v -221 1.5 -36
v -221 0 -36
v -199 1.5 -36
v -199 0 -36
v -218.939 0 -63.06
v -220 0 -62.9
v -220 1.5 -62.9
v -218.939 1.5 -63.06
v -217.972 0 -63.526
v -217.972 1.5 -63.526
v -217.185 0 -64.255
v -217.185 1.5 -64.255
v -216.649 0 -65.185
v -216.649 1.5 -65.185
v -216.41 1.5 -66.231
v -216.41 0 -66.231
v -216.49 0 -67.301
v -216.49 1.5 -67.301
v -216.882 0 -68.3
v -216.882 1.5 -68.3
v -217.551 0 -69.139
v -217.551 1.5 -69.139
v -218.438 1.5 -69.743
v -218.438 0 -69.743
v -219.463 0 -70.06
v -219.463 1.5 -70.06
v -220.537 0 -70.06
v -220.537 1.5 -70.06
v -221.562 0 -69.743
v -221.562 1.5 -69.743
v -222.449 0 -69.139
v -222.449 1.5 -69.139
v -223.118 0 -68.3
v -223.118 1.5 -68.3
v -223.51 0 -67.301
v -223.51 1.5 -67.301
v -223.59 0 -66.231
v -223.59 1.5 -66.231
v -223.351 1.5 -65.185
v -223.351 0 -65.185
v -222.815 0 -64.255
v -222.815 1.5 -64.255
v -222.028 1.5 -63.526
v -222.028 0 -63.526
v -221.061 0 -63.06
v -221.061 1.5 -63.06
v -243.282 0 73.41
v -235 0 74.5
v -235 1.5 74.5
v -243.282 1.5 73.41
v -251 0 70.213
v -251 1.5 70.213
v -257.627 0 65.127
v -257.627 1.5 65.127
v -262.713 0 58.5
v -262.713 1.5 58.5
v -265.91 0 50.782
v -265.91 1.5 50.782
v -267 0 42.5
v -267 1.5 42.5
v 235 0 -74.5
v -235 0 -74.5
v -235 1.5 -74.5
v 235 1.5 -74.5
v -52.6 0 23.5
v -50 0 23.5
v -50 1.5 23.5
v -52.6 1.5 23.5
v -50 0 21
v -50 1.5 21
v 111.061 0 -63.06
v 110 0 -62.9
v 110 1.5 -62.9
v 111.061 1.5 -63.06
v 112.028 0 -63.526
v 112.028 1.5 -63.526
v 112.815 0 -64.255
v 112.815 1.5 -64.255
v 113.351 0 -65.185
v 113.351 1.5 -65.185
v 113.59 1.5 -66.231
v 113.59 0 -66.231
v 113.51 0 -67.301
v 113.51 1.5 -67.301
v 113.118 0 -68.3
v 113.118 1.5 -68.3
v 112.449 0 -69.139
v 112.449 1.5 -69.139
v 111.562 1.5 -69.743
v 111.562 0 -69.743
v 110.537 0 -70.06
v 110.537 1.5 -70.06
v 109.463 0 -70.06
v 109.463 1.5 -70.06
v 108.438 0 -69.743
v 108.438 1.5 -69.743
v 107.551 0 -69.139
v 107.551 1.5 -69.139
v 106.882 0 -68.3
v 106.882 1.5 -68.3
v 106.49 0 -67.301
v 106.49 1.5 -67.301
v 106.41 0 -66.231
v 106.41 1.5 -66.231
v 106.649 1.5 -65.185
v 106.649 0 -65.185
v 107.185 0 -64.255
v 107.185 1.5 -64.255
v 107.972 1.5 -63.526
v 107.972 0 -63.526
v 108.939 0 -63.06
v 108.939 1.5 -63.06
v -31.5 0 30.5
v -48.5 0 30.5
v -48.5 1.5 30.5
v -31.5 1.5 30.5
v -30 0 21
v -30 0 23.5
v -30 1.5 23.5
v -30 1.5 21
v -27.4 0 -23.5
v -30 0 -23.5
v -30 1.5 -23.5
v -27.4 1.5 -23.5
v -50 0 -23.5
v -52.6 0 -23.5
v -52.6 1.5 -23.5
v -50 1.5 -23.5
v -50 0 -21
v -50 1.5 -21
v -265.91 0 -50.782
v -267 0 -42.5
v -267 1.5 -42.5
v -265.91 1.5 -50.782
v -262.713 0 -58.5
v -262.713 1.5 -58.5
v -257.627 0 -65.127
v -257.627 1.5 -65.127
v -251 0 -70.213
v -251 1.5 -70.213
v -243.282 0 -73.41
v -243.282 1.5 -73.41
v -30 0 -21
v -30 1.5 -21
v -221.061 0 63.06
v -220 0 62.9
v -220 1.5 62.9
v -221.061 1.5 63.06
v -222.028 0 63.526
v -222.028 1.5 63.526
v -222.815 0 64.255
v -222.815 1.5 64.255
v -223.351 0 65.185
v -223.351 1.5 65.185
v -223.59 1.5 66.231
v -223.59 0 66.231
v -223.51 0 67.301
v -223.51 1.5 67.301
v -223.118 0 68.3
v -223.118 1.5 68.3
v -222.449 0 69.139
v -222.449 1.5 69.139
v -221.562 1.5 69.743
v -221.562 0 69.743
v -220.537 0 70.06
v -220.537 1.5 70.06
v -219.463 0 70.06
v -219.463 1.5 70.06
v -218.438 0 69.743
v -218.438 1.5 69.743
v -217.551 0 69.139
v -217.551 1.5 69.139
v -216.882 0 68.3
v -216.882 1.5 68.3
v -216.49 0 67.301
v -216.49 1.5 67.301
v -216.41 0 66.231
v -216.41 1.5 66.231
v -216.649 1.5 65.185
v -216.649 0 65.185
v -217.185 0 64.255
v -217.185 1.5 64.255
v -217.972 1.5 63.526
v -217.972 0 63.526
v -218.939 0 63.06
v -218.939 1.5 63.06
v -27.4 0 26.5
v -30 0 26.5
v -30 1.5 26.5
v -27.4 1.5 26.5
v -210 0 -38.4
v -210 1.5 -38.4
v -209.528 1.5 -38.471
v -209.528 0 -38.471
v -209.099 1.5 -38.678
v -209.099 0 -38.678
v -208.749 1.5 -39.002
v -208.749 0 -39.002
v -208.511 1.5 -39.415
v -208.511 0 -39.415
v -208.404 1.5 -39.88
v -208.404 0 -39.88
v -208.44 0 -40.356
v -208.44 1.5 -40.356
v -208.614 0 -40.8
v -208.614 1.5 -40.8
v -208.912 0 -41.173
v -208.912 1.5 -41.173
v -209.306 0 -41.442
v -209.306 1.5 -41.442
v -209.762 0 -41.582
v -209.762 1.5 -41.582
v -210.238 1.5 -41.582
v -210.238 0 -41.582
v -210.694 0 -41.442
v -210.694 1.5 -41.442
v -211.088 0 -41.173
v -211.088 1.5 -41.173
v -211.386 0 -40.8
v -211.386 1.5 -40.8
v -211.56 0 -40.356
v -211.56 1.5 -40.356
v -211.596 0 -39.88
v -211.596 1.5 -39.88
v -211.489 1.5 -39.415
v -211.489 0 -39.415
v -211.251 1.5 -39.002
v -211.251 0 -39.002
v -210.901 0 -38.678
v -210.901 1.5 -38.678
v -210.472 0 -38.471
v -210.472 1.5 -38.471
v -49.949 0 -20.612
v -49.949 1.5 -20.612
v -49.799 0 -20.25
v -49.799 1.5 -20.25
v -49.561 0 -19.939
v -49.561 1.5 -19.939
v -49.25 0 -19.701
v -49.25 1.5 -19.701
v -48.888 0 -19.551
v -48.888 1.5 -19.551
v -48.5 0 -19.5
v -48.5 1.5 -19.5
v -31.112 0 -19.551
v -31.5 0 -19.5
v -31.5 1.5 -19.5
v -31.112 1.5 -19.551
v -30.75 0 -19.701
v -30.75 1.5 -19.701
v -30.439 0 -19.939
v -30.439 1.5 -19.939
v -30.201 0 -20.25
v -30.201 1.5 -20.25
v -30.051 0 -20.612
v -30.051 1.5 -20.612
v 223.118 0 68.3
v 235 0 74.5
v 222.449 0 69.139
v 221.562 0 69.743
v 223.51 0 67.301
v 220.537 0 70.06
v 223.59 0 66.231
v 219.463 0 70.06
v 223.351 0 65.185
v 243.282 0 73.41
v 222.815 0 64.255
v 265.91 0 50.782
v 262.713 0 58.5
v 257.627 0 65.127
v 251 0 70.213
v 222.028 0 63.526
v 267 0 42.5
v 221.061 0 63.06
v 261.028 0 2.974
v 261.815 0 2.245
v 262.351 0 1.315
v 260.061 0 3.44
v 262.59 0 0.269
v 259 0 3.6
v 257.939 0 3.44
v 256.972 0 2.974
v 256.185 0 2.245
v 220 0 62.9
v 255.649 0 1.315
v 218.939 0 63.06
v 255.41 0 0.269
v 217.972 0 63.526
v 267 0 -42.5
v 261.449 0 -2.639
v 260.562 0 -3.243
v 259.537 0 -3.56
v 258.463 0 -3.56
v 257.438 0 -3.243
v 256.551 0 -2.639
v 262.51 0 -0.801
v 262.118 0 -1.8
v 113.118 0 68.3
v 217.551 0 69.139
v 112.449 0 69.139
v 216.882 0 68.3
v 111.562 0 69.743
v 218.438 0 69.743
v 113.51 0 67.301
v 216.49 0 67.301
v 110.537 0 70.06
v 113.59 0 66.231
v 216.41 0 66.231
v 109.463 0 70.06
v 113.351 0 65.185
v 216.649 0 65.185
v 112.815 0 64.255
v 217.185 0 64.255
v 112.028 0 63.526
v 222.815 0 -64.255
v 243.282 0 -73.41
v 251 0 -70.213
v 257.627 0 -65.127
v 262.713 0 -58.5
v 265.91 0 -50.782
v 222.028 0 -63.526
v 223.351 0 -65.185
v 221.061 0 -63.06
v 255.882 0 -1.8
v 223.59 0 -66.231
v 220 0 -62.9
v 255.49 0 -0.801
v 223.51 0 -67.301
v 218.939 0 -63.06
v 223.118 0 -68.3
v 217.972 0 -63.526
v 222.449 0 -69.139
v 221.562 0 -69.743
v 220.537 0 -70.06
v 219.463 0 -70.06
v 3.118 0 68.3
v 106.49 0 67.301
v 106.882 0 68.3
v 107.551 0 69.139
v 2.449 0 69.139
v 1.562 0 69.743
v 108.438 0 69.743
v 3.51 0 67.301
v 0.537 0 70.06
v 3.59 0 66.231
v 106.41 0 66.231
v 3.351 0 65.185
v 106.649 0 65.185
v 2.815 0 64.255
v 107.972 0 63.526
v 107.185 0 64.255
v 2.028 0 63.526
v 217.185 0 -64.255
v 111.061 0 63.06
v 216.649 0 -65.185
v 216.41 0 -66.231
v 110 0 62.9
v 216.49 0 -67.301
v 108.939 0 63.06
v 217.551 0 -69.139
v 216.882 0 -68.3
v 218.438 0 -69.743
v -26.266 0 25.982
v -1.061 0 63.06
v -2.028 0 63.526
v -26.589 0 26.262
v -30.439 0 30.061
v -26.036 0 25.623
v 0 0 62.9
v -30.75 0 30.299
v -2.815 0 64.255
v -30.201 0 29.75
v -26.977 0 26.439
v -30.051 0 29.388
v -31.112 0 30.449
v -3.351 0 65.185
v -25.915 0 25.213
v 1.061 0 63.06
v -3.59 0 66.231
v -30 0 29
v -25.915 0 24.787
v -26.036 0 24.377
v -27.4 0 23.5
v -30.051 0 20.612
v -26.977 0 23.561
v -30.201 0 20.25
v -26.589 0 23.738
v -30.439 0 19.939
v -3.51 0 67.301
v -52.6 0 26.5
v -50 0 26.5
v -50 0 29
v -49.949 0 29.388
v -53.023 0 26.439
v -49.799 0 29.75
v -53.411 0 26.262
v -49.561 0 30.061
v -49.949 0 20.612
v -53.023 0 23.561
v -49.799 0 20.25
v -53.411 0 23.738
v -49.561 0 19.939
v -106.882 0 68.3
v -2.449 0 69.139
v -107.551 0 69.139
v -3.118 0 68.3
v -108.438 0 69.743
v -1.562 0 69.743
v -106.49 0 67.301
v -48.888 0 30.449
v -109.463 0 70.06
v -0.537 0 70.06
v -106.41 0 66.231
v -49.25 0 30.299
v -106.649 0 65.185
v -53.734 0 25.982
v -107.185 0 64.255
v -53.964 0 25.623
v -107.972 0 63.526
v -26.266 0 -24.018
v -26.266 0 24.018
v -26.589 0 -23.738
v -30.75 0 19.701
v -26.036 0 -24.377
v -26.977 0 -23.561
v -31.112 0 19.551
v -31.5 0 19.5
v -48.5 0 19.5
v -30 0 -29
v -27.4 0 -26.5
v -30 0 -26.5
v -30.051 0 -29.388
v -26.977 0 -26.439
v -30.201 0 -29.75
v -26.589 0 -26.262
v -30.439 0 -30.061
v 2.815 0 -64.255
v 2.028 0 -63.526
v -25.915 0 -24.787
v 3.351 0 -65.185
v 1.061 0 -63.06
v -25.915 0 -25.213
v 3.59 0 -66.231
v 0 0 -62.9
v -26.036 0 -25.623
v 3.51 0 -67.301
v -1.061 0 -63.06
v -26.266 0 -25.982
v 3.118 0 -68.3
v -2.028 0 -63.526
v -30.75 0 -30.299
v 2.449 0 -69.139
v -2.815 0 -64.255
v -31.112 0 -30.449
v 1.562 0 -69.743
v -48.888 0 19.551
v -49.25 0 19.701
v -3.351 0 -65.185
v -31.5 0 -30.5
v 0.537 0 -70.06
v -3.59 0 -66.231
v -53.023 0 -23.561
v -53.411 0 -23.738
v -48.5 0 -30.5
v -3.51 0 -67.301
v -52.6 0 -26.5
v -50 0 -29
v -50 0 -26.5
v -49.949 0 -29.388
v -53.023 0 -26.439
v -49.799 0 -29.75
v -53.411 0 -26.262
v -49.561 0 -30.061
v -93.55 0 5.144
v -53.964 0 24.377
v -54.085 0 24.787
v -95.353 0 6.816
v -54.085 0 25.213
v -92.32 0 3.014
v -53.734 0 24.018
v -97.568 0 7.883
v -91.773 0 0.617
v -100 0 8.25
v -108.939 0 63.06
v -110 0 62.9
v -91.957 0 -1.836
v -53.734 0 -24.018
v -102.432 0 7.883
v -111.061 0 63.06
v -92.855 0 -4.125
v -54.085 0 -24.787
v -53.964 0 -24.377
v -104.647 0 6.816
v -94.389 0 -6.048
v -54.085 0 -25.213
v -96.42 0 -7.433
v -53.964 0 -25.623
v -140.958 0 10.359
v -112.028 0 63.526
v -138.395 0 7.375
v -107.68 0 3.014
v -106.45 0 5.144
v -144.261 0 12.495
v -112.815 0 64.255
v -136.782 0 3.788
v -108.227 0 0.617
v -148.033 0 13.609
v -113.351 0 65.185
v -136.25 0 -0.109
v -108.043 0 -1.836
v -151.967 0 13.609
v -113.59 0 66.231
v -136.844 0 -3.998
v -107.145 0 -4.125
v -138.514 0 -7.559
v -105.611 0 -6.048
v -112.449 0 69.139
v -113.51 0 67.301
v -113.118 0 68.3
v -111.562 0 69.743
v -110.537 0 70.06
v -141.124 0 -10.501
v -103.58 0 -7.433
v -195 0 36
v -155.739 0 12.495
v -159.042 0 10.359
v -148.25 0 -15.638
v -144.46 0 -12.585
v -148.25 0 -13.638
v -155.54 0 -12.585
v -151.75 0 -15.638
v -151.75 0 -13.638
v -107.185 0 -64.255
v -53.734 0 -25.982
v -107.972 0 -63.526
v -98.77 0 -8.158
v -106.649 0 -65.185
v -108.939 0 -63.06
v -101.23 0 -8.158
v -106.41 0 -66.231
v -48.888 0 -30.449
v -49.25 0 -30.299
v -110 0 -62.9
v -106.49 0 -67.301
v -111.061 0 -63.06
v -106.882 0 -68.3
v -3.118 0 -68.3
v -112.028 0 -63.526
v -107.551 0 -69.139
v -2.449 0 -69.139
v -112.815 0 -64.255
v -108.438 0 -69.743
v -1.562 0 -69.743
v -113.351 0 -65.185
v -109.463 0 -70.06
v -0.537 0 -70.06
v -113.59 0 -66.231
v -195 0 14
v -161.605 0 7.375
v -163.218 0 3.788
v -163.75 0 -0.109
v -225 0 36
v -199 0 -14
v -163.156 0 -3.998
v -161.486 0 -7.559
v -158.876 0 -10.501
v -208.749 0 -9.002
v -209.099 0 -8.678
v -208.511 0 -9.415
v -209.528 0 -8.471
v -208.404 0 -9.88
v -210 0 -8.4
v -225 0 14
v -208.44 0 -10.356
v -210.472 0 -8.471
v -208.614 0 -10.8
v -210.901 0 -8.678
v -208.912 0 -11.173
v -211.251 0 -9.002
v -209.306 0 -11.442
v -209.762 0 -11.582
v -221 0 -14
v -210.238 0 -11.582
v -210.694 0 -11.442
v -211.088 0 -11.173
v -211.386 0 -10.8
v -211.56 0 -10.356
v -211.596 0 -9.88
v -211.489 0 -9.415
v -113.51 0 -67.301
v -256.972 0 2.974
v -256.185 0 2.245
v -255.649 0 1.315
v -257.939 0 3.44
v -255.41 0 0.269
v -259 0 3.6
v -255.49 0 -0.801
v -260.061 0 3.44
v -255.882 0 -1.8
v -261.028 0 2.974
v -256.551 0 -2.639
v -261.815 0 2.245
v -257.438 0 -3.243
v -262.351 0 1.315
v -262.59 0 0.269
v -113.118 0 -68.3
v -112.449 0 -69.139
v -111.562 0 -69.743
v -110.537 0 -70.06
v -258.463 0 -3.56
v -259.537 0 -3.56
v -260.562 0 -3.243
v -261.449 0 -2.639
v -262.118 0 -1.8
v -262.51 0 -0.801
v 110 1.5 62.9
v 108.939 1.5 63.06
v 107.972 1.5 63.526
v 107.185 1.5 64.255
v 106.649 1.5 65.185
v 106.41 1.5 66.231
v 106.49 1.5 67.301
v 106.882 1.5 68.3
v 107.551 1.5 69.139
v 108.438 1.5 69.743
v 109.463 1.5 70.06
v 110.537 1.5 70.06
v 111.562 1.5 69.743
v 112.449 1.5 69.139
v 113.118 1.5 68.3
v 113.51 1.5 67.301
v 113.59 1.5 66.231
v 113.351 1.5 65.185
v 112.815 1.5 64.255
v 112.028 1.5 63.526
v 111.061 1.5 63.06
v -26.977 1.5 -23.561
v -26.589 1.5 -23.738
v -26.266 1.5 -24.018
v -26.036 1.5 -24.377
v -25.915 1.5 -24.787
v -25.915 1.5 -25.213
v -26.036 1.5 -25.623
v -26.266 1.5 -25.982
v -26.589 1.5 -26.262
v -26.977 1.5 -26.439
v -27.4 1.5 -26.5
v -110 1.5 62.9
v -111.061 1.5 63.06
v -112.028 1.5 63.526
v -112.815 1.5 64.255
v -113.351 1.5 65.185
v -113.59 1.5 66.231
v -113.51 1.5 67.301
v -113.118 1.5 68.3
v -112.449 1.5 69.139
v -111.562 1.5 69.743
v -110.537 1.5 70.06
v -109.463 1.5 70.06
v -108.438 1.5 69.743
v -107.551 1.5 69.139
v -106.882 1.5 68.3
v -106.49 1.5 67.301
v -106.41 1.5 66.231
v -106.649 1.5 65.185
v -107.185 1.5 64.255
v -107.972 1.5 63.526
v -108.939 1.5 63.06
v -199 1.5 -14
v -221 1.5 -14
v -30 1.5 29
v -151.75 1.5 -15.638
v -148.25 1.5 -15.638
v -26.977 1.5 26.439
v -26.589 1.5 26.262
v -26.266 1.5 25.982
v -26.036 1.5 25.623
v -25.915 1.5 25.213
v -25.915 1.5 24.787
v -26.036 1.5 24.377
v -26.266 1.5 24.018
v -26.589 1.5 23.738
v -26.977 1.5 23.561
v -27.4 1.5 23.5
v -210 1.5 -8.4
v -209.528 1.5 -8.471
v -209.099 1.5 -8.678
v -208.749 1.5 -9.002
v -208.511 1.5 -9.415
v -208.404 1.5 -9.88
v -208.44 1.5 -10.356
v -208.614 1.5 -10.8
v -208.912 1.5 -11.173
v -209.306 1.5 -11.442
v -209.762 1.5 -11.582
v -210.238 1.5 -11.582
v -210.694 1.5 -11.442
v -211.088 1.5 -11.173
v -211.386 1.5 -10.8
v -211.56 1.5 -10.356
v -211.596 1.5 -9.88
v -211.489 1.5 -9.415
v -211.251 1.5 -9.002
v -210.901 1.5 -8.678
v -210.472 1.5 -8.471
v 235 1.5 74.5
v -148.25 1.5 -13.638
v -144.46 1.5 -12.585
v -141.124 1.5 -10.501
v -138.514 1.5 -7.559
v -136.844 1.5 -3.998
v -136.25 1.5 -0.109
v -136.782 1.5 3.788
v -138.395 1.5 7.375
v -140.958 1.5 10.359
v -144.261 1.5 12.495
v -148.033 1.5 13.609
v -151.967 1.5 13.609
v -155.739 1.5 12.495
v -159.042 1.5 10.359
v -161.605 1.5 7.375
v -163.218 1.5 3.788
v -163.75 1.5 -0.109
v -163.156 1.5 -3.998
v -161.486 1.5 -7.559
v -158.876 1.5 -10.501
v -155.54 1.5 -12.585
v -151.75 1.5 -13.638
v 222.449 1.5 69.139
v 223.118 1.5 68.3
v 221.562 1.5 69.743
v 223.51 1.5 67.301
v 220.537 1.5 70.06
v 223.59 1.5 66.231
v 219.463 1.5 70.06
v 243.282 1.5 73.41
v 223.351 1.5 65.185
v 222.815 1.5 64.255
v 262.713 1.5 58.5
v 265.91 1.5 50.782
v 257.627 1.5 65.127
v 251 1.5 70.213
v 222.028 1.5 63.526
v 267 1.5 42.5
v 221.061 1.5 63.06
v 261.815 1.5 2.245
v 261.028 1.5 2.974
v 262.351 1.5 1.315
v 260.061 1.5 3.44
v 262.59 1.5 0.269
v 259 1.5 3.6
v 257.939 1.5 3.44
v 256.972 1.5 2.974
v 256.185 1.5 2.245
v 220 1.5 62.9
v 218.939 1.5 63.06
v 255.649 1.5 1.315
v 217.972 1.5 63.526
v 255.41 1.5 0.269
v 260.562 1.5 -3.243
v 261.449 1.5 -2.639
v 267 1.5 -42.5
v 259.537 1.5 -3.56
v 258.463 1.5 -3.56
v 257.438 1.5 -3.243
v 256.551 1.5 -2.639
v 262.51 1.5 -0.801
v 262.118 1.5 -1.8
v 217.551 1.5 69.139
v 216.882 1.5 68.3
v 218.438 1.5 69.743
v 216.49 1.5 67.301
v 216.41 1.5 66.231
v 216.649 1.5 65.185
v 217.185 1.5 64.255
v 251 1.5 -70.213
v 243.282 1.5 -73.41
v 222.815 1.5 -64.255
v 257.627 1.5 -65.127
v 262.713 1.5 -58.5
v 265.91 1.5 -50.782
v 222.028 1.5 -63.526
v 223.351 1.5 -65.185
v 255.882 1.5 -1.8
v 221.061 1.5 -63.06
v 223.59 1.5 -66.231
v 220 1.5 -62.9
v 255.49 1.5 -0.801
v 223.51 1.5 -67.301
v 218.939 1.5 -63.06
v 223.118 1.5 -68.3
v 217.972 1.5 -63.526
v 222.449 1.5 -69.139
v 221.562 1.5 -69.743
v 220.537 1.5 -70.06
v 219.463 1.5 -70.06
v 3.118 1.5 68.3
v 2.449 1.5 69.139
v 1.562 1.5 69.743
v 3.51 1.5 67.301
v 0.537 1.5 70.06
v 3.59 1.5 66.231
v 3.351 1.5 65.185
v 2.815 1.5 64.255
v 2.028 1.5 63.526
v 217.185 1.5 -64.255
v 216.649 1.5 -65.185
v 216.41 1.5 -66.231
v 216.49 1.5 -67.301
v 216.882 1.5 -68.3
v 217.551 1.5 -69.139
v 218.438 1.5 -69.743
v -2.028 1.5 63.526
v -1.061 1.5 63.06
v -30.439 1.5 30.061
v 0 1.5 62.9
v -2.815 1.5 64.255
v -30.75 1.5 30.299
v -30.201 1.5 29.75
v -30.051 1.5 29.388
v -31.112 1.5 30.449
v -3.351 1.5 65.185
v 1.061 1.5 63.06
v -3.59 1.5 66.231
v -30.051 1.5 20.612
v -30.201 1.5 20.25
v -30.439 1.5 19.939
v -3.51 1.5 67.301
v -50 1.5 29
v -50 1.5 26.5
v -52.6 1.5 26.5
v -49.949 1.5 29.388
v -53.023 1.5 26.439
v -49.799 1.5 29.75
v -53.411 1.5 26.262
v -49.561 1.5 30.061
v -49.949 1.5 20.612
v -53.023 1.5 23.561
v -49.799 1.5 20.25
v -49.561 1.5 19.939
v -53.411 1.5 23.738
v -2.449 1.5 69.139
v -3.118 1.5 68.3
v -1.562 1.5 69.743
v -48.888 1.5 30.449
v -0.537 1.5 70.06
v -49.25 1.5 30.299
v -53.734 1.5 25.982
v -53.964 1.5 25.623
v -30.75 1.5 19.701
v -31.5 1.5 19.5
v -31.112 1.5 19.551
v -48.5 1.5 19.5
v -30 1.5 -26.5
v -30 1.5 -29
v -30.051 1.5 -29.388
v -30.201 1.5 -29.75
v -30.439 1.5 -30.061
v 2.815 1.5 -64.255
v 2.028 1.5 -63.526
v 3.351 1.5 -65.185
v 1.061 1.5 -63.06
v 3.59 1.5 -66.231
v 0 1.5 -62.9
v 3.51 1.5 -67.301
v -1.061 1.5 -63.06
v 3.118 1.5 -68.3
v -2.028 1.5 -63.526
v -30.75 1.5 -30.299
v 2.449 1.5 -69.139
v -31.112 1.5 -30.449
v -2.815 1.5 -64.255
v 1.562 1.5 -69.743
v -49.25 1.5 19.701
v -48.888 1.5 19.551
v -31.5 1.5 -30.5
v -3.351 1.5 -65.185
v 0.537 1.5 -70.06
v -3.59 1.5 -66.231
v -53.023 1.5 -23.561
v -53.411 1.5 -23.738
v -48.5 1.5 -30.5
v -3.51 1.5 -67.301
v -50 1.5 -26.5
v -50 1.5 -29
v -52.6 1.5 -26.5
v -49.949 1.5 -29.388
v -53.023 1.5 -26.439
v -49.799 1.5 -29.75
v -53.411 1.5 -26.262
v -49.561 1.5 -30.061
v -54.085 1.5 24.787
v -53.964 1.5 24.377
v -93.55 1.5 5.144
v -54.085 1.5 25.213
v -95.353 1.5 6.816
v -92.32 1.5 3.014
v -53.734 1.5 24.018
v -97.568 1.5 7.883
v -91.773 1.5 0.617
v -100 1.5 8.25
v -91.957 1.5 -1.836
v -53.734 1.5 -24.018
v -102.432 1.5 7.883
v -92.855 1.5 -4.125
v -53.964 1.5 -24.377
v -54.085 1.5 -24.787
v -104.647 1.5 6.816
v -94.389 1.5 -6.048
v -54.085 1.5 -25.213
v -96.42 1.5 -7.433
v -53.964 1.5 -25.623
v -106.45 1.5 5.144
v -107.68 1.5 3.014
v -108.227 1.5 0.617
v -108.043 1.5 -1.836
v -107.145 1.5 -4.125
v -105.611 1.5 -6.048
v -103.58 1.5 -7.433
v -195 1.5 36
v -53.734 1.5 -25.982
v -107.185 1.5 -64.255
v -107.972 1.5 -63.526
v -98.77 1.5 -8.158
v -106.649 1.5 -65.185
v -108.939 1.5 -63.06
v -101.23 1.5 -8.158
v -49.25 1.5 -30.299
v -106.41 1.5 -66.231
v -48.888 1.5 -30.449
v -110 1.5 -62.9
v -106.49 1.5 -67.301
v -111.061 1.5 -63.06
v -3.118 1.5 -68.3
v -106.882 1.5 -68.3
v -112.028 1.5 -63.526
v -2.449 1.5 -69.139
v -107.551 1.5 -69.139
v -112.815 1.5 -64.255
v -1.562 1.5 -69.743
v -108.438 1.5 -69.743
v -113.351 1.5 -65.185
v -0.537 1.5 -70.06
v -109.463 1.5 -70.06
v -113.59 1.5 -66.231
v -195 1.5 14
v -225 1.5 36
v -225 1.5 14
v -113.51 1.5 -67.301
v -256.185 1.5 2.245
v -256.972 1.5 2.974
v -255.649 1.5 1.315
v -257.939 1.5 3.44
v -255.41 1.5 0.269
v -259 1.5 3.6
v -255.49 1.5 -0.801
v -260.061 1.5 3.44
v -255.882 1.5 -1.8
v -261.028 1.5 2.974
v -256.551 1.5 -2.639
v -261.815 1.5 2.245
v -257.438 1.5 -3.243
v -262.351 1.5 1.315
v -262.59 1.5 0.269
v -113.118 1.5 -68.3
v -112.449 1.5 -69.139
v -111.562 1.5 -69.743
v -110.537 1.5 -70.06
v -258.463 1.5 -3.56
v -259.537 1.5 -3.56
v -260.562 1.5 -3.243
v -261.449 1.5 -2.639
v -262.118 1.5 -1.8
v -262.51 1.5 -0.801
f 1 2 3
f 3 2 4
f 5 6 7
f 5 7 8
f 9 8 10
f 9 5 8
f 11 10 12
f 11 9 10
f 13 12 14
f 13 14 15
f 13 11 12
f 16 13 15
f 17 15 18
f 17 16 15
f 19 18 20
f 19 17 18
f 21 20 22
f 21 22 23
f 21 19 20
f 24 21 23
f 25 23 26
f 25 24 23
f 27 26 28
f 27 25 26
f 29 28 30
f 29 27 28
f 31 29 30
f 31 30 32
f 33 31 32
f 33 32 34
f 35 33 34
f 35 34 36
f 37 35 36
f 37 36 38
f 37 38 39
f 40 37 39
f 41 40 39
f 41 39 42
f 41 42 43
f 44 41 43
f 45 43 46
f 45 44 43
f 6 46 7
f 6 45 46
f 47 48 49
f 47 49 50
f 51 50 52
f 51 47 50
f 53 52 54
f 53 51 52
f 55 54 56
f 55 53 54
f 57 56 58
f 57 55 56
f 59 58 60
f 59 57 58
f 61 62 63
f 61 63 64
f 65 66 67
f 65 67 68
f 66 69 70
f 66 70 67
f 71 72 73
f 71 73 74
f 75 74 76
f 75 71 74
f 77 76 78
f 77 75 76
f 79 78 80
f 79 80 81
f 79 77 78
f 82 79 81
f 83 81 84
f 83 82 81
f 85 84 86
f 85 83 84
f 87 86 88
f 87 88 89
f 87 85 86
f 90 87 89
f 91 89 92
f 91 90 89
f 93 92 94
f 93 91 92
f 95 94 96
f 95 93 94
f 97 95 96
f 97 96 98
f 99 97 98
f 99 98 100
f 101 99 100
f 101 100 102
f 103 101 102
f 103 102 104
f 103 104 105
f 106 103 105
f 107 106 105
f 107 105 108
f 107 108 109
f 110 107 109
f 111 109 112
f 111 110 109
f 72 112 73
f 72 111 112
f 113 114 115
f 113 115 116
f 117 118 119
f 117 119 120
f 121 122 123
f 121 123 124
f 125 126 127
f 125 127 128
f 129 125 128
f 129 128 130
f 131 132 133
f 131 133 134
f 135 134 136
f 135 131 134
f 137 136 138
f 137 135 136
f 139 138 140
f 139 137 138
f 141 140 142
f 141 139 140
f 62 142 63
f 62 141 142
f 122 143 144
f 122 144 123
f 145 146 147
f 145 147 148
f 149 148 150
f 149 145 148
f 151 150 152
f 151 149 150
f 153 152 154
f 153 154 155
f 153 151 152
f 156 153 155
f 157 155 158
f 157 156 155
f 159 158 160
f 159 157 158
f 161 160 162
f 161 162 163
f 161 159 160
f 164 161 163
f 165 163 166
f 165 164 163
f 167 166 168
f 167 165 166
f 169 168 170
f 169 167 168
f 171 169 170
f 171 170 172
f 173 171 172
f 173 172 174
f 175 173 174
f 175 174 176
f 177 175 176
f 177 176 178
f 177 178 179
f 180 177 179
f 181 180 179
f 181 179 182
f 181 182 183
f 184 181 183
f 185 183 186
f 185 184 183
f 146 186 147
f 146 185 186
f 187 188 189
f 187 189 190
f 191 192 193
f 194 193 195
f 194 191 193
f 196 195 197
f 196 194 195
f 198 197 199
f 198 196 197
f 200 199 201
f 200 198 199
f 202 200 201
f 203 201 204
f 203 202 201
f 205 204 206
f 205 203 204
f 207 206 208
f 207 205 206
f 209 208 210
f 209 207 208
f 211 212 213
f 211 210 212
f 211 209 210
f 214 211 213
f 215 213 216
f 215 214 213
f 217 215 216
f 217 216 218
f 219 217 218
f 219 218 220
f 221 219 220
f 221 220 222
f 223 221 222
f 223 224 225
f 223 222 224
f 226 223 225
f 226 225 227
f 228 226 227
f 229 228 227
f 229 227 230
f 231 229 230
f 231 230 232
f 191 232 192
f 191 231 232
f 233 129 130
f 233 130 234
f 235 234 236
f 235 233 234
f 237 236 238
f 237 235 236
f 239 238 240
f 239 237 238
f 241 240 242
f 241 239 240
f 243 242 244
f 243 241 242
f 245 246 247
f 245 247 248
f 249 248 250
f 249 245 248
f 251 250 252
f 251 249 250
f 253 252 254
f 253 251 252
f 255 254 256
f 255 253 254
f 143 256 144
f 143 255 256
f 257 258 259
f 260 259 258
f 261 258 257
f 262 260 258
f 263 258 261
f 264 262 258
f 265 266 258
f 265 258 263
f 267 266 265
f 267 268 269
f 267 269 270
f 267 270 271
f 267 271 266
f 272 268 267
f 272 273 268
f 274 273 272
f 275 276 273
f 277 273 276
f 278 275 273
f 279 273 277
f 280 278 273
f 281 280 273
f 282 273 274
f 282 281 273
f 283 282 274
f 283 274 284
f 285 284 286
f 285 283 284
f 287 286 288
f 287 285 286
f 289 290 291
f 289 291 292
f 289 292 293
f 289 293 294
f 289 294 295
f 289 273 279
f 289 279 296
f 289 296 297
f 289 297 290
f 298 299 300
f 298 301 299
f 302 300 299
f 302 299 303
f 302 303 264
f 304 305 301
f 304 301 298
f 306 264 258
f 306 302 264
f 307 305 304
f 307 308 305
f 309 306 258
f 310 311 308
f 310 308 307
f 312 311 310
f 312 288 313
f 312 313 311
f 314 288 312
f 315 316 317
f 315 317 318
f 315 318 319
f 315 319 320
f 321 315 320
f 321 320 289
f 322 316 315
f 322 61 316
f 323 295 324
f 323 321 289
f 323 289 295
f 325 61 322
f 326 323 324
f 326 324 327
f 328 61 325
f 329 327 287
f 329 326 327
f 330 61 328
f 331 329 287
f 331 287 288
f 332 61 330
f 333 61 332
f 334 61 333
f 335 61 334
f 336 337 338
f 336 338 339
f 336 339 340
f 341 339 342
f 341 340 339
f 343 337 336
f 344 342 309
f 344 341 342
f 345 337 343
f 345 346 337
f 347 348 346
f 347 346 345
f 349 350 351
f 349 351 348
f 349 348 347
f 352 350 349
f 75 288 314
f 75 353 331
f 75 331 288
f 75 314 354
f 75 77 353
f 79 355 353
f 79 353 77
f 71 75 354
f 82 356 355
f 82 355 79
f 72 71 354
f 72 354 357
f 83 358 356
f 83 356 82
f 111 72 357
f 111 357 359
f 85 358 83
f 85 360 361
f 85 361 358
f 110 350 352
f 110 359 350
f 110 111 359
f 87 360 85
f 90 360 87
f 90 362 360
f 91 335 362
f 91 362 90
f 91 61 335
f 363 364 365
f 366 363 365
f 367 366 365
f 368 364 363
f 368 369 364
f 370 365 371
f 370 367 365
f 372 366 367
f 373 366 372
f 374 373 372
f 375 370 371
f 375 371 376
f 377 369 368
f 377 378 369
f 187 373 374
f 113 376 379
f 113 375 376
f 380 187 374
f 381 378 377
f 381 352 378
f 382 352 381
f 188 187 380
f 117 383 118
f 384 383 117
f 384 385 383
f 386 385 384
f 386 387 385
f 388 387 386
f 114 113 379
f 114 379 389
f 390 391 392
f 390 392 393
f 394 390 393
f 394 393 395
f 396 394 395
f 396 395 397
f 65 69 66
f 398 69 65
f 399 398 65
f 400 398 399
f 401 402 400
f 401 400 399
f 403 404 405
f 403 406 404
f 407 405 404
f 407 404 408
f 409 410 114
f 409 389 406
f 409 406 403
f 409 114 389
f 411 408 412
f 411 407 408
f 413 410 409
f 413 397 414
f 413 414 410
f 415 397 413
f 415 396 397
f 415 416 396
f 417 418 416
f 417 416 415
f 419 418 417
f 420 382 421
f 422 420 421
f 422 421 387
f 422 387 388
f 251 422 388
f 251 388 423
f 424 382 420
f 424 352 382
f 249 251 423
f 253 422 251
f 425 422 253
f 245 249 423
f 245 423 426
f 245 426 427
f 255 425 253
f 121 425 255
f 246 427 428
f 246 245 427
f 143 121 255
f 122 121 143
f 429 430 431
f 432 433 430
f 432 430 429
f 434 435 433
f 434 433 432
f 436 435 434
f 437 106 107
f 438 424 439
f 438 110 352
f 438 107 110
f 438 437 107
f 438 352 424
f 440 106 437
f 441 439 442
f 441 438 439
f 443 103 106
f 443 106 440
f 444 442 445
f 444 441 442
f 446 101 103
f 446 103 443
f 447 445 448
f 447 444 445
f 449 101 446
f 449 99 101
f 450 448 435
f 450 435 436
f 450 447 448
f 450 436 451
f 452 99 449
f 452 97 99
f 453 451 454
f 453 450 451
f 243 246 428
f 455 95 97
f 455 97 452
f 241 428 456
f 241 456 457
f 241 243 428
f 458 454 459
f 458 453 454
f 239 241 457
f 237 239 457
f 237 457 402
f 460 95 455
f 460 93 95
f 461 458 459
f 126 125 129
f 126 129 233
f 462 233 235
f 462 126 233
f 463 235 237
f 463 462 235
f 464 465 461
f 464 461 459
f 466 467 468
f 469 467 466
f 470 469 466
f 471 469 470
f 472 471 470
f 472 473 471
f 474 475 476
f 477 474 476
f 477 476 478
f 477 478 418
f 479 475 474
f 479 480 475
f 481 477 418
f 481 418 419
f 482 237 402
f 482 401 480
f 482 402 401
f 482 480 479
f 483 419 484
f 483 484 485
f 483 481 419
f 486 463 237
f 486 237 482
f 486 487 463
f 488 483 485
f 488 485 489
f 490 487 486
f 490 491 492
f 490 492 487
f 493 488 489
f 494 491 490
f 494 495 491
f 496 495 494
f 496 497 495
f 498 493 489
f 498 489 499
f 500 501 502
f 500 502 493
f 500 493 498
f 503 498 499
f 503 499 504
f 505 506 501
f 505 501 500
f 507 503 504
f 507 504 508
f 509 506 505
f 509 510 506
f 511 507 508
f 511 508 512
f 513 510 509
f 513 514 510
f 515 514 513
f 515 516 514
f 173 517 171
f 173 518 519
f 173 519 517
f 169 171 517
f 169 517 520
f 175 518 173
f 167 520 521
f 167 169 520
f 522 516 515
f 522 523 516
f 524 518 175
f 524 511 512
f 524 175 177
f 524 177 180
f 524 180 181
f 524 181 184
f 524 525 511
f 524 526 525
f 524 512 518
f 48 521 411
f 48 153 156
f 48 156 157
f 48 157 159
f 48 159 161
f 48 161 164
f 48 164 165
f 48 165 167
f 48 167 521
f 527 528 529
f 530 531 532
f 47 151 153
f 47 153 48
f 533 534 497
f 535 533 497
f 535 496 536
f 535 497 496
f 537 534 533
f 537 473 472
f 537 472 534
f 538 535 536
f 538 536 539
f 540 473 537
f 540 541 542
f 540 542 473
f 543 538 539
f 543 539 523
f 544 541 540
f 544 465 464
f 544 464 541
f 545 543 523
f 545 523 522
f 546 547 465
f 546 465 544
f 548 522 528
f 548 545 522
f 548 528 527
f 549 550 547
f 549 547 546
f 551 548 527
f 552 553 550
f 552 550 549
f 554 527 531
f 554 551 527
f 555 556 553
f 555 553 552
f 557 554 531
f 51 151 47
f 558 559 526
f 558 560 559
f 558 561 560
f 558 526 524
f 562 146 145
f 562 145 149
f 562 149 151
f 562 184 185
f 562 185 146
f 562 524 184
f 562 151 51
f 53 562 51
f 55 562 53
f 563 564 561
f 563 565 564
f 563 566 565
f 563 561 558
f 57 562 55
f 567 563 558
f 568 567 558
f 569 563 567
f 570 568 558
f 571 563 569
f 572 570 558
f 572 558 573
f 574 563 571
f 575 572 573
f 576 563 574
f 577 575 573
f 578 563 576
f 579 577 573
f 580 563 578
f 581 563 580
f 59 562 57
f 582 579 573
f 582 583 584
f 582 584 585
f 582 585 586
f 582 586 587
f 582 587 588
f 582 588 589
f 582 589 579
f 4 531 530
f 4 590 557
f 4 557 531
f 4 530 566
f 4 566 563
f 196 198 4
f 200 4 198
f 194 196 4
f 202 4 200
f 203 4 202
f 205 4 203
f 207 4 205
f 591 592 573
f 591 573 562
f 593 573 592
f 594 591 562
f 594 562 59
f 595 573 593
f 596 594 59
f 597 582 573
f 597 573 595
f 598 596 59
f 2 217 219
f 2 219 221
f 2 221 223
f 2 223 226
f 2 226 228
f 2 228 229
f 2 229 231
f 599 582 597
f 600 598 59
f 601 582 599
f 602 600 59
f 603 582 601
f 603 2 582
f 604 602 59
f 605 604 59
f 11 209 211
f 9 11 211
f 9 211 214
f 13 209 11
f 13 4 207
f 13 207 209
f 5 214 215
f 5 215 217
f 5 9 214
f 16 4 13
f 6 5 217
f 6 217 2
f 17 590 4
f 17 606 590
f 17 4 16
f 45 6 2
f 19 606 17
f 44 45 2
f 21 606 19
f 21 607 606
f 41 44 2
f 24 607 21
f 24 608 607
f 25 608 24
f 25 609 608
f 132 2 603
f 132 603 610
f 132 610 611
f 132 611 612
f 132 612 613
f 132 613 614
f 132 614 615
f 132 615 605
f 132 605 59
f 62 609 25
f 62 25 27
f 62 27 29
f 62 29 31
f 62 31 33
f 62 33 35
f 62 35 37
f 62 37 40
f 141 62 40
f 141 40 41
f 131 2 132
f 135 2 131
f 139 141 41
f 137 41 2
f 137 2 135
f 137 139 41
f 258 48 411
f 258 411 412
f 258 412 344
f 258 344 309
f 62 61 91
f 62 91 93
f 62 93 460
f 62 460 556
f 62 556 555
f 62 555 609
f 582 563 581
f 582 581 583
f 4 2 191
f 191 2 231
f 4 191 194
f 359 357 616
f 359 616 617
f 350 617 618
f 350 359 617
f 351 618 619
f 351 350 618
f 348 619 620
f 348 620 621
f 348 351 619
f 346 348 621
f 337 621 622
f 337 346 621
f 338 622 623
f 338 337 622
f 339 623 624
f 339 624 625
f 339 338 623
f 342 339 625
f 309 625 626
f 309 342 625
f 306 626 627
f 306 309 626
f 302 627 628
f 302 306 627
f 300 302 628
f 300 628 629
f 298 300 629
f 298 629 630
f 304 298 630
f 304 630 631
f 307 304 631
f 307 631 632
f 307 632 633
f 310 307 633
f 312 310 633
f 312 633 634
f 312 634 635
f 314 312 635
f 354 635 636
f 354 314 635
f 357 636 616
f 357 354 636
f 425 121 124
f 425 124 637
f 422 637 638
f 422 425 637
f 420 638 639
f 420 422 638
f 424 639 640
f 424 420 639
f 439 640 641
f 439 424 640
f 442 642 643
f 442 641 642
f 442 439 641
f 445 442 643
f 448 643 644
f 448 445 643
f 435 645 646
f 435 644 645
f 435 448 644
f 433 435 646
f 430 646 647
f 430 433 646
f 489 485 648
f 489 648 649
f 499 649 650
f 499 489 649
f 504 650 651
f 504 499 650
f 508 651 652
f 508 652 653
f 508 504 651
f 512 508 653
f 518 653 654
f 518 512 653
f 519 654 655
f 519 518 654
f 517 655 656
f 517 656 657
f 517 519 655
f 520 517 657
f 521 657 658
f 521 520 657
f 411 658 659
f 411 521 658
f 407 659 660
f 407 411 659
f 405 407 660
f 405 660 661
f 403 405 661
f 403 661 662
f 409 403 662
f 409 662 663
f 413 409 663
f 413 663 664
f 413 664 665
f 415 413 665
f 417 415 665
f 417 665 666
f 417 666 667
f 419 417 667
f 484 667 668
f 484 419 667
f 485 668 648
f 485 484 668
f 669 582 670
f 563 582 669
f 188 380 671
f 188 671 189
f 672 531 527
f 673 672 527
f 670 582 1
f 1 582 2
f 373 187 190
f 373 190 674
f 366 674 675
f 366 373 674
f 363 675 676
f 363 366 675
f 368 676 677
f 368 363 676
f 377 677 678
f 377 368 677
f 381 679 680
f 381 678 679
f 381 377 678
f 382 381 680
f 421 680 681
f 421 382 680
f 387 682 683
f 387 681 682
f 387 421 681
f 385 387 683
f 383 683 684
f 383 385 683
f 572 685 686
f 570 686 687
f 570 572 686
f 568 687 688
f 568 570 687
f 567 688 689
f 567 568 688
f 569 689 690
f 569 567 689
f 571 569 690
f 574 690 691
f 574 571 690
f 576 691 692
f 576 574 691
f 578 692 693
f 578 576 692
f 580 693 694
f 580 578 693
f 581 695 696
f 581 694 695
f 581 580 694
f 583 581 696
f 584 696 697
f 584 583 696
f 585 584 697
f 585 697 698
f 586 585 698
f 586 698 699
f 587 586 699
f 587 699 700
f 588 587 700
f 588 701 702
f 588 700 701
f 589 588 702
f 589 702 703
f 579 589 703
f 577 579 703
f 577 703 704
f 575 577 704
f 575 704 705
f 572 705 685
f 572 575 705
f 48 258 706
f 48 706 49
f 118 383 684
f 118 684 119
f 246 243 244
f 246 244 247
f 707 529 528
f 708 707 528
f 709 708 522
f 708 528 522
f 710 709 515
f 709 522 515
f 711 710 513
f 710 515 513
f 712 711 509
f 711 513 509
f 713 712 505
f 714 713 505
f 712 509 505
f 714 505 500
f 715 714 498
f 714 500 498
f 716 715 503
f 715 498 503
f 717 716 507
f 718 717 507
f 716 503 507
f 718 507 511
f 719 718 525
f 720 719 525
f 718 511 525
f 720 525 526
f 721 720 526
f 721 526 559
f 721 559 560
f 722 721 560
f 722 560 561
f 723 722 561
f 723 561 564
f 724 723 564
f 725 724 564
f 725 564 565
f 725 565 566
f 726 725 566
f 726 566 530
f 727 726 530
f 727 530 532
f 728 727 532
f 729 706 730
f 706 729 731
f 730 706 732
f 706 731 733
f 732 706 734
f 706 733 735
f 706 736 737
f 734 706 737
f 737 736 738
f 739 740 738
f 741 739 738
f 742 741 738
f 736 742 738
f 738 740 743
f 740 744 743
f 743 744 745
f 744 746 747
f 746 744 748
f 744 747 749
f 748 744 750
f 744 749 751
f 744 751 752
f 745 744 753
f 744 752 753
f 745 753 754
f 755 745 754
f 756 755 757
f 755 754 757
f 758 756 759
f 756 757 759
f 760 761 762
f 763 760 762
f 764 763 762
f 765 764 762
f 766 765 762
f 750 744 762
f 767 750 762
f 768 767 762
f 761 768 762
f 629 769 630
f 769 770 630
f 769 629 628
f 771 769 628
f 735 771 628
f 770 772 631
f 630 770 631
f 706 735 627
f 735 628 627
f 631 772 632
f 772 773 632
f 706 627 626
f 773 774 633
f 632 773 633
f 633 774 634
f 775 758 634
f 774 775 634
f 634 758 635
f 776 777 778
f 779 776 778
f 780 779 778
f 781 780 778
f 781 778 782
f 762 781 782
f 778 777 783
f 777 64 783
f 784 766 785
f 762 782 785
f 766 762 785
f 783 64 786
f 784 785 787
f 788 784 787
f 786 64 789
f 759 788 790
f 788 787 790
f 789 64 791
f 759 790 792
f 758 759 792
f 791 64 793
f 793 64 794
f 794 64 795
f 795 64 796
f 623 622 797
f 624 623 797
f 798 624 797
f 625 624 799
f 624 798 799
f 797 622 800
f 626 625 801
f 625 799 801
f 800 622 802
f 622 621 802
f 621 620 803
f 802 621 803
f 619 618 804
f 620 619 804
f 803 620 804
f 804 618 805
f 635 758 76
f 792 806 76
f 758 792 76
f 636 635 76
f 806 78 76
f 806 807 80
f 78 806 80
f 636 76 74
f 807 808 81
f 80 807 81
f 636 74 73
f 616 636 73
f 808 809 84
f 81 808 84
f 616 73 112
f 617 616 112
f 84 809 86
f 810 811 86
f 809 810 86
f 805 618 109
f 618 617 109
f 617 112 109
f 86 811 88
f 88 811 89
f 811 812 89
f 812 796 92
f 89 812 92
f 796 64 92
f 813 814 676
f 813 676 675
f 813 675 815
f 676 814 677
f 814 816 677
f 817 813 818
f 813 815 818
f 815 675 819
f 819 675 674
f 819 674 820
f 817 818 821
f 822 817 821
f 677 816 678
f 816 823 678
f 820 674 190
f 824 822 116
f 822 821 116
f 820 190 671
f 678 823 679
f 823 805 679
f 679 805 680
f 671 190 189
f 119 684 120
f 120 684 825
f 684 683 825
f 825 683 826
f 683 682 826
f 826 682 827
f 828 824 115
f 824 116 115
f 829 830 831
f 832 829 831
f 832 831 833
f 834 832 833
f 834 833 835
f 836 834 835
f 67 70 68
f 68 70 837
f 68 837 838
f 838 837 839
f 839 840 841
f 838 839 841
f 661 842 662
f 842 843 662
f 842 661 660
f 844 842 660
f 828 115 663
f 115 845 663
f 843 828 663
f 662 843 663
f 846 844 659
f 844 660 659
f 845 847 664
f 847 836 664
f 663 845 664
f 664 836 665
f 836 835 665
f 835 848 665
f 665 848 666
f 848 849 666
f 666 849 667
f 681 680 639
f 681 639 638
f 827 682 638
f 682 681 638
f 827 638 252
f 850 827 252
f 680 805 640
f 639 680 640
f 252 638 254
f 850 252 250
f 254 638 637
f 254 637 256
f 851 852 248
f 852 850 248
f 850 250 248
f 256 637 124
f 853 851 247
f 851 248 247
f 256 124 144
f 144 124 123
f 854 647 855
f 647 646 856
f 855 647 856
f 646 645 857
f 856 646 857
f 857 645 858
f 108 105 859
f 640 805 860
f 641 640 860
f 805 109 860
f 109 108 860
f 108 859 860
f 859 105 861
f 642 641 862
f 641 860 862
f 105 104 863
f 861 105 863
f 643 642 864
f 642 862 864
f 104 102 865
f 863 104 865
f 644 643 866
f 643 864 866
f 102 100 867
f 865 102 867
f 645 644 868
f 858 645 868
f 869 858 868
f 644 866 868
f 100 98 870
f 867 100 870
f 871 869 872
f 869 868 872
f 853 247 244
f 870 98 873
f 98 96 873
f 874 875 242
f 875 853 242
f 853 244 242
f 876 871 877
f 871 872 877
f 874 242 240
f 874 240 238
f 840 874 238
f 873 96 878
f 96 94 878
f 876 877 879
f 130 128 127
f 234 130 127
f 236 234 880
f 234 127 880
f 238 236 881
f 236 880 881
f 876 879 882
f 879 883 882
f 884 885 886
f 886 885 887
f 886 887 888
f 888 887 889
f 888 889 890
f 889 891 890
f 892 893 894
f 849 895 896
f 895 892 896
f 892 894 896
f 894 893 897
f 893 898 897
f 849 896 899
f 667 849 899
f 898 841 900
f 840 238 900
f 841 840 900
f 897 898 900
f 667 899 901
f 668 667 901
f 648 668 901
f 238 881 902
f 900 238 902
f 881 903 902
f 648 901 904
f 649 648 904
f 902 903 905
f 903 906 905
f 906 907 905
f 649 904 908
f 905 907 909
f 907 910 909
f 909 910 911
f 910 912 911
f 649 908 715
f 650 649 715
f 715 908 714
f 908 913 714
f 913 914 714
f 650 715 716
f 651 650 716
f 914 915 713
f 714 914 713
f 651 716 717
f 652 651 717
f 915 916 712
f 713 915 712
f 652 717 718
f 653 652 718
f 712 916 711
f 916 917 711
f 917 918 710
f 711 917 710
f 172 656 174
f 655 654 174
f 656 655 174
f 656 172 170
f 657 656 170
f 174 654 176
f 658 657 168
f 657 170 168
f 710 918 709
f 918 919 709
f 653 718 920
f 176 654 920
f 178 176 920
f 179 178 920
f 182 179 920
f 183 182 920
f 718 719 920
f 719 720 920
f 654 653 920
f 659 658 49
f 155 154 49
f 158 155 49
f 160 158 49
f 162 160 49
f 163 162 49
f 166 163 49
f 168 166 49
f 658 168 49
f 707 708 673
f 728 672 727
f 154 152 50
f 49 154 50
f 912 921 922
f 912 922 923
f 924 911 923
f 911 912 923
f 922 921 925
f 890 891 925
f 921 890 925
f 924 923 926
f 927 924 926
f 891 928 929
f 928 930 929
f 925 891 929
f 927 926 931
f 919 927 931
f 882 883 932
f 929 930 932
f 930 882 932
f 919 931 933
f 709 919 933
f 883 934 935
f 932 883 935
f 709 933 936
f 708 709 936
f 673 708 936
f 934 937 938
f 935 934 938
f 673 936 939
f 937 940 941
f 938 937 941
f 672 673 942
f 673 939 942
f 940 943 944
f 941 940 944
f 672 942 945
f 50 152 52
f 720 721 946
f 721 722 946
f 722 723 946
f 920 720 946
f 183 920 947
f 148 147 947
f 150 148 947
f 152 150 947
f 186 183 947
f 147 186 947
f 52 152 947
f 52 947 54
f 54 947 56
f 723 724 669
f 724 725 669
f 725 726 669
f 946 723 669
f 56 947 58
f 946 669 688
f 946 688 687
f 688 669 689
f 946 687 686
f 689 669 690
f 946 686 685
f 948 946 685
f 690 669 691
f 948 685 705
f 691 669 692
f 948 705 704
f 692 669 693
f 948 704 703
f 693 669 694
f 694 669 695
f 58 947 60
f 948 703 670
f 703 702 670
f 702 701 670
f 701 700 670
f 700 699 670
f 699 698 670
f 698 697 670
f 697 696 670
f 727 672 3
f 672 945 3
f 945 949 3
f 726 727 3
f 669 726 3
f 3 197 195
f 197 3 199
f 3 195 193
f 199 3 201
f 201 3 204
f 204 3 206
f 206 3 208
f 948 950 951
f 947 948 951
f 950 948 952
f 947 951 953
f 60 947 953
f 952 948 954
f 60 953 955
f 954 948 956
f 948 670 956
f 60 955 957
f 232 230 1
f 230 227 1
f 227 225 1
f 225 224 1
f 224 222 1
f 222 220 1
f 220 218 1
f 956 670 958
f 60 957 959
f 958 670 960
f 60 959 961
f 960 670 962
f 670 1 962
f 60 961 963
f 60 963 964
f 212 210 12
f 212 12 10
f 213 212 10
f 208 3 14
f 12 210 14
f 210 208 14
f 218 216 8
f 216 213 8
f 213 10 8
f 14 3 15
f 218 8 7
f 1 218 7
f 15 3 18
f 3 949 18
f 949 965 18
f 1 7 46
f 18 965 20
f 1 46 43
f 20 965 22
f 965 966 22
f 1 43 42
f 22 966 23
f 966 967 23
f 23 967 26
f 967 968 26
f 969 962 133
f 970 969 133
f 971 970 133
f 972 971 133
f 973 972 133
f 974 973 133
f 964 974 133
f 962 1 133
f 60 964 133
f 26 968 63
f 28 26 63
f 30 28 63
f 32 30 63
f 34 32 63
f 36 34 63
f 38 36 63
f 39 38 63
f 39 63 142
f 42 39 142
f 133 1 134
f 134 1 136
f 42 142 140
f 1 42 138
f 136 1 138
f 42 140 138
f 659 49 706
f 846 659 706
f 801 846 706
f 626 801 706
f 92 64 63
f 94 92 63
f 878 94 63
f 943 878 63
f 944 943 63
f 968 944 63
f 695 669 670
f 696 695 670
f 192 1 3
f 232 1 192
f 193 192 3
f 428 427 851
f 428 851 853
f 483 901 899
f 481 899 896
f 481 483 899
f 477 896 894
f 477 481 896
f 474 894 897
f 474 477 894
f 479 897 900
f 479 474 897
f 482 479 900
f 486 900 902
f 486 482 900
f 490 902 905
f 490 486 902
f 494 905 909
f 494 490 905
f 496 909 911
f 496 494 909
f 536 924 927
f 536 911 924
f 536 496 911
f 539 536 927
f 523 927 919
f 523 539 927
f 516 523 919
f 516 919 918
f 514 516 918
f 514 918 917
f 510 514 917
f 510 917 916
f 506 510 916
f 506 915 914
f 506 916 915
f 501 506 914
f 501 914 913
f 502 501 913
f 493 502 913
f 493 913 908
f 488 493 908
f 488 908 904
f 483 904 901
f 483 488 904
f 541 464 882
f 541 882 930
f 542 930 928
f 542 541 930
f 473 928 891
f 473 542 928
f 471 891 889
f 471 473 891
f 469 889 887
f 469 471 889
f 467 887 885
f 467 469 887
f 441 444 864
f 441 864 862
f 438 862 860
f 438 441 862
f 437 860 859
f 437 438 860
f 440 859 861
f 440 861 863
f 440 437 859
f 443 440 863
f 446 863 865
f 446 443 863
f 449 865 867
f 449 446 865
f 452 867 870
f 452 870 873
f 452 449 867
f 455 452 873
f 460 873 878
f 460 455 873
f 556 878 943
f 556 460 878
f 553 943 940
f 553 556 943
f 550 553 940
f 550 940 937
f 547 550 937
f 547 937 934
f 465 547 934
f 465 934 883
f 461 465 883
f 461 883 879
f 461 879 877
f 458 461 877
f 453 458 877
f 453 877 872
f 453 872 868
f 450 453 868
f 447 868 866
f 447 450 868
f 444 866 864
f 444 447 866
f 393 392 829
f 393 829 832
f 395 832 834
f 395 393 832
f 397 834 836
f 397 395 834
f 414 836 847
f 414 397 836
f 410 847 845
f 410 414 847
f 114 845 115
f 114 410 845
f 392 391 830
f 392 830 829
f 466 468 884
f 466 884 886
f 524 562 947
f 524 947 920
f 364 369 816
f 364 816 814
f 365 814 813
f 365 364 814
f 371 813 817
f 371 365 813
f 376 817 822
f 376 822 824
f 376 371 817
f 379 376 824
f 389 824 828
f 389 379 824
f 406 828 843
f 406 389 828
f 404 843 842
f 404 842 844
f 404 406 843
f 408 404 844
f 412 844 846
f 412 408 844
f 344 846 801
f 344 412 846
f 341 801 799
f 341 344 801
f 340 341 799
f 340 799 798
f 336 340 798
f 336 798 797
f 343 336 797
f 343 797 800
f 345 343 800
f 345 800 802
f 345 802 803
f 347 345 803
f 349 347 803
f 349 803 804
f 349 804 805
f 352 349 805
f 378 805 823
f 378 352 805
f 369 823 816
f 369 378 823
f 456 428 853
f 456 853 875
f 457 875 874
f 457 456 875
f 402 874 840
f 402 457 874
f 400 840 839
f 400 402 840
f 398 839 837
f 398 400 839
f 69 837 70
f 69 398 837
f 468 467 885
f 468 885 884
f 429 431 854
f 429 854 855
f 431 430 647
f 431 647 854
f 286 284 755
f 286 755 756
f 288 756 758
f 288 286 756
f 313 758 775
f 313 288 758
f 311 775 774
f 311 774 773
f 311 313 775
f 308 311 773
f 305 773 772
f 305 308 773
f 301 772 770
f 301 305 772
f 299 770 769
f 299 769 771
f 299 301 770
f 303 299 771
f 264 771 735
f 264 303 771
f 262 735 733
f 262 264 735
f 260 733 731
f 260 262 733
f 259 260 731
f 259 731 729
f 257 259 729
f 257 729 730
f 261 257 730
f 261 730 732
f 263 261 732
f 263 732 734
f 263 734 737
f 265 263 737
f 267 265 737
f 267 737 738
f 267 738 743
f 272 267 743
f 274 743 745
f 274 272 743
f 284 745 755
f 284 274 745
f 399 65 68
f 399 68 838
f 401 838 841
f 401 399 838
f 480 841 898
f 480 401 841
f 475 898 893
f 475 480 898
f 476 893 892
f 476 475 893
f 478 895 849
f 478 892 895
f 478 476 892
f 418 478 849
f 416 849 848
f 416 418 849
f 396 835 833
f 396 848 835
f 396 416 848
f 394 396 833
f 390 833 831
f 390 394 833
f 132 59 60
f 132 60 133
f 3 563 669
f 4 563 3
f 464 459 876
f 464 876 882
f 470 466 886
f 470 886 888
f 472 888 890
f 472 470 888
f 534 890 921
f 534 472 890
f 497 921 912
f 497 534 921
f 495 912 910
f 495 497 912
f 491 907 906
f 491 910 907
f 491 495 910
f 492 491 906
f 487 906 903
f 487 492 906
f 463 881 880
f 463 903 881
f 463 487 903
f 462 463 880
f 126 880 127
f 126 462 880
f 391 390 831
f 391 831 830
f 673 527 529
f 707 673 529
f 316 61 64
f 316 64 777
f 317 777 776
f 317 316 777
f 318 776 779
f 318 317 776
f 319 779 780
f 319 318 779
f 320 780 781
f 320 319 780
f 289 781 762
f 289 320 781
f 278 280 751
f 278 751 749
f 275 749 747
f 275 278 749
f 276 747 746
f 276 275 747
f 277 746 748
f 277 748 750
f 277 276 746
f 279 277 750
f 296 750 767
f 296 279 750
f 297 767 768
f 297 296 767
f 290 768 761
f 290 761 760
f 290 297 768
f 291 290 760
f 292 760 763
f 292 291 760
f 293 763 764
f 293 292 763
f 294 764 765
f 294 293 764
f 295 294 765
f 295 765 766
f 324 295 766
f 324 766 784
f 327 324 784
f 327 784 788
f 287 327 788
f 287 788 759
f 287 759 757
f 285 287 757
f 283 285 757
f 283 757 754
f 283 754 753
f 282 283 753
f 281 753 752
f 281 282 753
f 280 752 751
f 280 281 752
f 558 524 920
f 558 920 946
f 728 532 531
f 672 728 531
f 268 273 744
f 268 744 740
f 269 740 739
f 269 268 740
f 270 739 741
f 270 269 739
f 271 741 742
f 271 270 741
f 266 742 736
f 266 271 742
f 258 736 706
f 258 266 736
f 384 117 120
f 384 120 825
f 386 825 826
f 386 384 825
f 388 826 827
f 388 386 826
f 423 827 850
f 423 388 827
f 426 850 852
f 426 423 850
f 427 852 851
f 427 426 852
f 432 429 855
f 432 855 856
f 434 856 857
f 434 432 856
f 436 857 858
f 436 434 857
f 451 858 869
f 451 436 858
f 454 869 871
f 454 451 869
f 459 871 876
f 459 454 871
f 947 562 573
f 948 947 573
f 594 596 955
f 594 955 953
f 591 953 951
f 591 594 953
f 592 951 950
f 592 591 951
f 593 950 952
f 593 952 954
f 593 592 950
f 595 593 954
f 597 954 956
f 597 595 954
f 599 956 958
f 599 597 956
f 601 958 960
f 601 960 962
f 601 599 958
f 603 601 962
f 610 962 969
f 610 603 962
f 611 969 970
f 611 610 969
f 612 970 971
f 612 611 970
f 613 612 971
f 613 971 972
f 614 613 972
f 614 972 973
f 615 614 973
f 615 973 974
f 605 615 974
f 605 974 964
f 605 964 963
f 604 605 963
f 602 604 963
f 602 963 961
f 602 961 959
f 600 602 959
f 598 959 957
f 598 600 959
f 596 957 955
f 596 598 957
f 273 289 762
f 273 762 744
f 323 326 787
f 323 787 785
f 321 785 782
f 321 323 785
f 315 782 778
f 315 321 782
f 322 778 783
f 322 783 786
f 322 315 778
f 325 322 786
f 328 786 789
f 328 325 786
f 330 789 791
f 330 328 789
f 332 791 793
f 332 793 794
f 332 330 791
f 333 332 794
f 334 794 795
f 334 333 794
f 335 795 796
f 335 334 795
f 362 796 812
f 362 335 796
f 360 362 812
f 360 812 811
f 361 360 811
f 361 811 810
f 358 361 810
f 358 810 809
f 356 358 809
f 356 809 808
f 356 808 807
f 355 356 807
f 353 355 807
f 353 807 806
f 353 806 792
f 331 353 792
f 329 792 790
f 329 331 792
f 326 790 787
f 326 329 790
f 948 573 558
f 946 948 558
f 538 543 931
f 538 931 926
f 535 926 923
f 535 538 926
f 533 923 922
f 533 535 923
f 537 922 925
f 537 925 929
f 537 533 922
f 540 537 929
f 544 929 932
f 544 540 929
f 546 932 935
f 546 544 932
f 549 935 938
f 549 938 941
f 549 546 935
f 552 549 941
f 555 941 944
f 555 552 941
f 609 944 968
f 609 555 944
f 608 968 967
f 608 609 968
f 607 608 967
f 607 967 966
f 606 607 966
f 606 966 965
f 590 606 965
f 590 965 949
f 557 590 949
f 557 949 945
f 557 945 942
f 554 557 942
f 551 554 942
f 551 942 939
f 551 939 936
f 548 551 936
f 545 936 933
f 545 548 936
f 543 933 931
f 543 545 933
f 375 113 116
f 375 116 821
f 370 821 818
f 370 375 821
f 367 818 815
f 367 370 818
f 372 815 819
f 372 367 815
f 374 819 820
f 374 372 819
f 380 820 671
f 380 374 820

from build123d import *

# Parameters (mm, degrees)
SKETCH1_R           = 3.6
BOSS_EXTRUDE1_DEPTH = 1.5
SKETCH2_R           = 1.6
SKETCH2_R_2         = 8.25
SKETCH2_W           = 22
SKETCH2_H           = 22
SKETCH2_W_2         = 30
CUT_EXTRUDE1_DEPTH  = 278.202994212


with BuildPart() as part:
    # Sketch1 → Boss-Extrude1 (new body)
    with BuildSketch(Plane(origin=(0, 0, 0), x_dir=(1, 0, 0), z_dir=(0, 1, 0))):
        with BuildLine():
            Line((235, -74.5), (-235, -74.5))
            ThreePointArc((-235, -74.5), (-257.627416998, -65.127416998), (-267, -42.5))
            Line((-267, -42.5), (-267, 42.5))
            ThreePointArc((-267, 42.5), (-257.627416998, 65.127416998), (-235, 74.5))
            Line((-235, 74.5), (235, 74.5))
            ThreePointArc((235, 74.5), (257.627416998, 65.127416998), (267, 42.5))
            Line((267, 42.5), (267, -42.5))
            ThreePointArc((267, -42.5), (257.627416998, -65.127416998), (235, -74.5))
        make_face()
        with Locations(Location((-259, 0, 0), (0, 0, 270))):
            Circle(SKETCH1_R, mode=Mode.SUBTRACT)
        with Locations(Location((259, 0, 0), (0, 0, 270))):
            Circle(SKETCH1_R, mode=Mode.SUBTRACT)
        with Locations(Location((-220, 66.5, 0), (0, 0, 270))):
            Circle(SKETCH1_R, mode=Mode.SUBTRACT)
        with Locations(Location((-110, 66.5, 0), (0, 0, 270))):
            Circle(SKETCH1_R, mode=Mode.SUBTRACT)
        with Locations(Location((0, 66.5, 0), (0, 0, 270))):
            Circle(SKETCH1_R, mode=Mode.SUBTRACT)
        with Locations(Location((110, 66.5, 0), (0, 0, 270))):
            Circle(SKETCH1_R, mode=Mode.SUBTRACT)
        with Locations(Location((220, 66.5, 0), (0, 0, 270))):
            Circle(SKETCH1_R, mode=Mode.SUBTRACT)
        with Locations(Location((220, -66.5, 0), (0, 0, 90))):
            Circle(SKETCH1_R, mode=Mode.SUBTRACT)
        with Locations(Location((110, -66.5, 0), (0, 0, 90))):
            Circle(SKETCH1_R, mode=Mode.SUBTRACT)
        with Locations(Location((0, -66.5, 0), (0, 0, 90))):
            Circle(SKETCH1_R, mode=Mode.SUBTRACT)
        with Locations(Location((-110, -66.5, 0), (0, 0, 90))):
            Circle(SKETCH1_R, mode=Mode.SUBTRACT)
        with Locations(Location((-220, -66.5, 0), (0, 0, 90))):
            Circle(SKETCH1_R, mode=Mode.SUBTRACT)
    extrude(amount=BOSS_EXTRUDE1_DEPTH)

    # Sketch2 → Cut-Extrude1 (cut, through all)
    with BuildSketch(Plane(origin=(0, 0, 0), x_dir=(1, 0, 0), z_dir=(0, 1, 0))):
        with Locations(Location((-210, 10, 0), (0, 0, 270))):
            Circle(SKETCH2_R)
        with Locations(Location((-210, 40, 0), (0, 0, 270))):
            Circle(SKETCH2_R)
        with Locations(Location((-100, 0, 0), (0, 0, 270))):
            Circle(SKETCH2_R_2)
        with Locations((-210, 25)):
            Rectangle(SKETCH2_W, SKETCH2_H)
        with BuildLine():
            Line((-151.75, 15.638181697), (-148.25, 15.638181697))
            Line((-148.25, 15.638181697), (-148.25, 13.638181697))
            ThreePointArc((-148.25, 13.638181697), (-150, -13.75), (-151.75, 13.638181697))
            Line((-151.75, 13.638181697), (-151.75, 15.638181697))
        make_face()
        with Locations((-210, -25)):
            Rectangle(SKETCH2_W_2, SKETCH2_H)
        with BuildLine():
            Line((-31.5, 30.5), (-48.5, 30.5))
            ThreePointArc((-48.5, 30.5), (-49.560660172, 30.060660172), (-50, 29))
            Line((-50, 29), (-50, 26.5))
            Line((-50, 26.5), (-52.6, 26.5))
            ThreePointArc((-52.6, 26.5), (-54.1, 25), (-52.6, 23.5))
            Line((-52.6, 23.5), (-50, 23.5))
            Line((-50, 23.5), (-50, 21))
            ThreePointArc((-50, 21), (-49.560660172, 19.939339828), (-48.5, 19.5))
            Line((-48.5, 19.5), (-31.5, 19.5))
            ThreePointArc((-31.5, 19.5), (-30.439339828, 19.939339828), (-30, 21))
            Line((-30, 21), (-30, 23.5))
            Line((-30, 23.5), (-27.4, 23.5))
            ThreePointArc((-27.4, 23.5), (-25.9, 25), (-27.4, 26.5))
            Line((-27.4, 26.5), (-30, 26.5))
            Line((-30, 26.5), (-30, 29))
            ThreePointArc((-30, 29), (-30.439339828, 30.060660172), (-31.5, 30.5))
        make_face()
        with BuildLine():
            Line((-31.5, -19.5), (-48.5, -19.5))
            ThreePointArc((-48.5, -19.5), (-49.560660172, -19.939339828), (-50, -21))
            Line((-50, -21), (-50, -23.5))
            Line((-50, -23.5), (-52.6, -23.5))
            ThreePointArc((-52.6, -23.5), (-54.1, -25), (-52.6, -26.5))
            Line((-52.6, -26.5), (-50, -26.5))
            Line((-50, -26.5), (-50, -29))
            ThreePointArc((-50, -29), (-49.560660172, -30.060660172), (-48.5, -30.5))
            Line((-48.5, -30.5), (-31.5, -30.5))
            ThreePointArc((-31.5, -30.5), (-30.439339828, -30.060660172), (-30, -29))
            Line((-30, -29), (-30, -26.5))
            Line((-30, -26.5), (-27.4, -26.5))
            ThreePointArc((-27.4, -26.5), (-25.9, -25), (-27.4, -23.5))
            Line((-27.4, -23.5), (-30, -23.5))
            Line((-30, -23.5), (-30, -21))
            ThreePointArc((-30, -21), (-30.439339828, -19.939339828), (-31.5, -19.5))
        make_face()
    extrude(amount=CUT_EXTRUDE1_DEPTH, mode=Mode.SUBTRACT)


solid = part.part
